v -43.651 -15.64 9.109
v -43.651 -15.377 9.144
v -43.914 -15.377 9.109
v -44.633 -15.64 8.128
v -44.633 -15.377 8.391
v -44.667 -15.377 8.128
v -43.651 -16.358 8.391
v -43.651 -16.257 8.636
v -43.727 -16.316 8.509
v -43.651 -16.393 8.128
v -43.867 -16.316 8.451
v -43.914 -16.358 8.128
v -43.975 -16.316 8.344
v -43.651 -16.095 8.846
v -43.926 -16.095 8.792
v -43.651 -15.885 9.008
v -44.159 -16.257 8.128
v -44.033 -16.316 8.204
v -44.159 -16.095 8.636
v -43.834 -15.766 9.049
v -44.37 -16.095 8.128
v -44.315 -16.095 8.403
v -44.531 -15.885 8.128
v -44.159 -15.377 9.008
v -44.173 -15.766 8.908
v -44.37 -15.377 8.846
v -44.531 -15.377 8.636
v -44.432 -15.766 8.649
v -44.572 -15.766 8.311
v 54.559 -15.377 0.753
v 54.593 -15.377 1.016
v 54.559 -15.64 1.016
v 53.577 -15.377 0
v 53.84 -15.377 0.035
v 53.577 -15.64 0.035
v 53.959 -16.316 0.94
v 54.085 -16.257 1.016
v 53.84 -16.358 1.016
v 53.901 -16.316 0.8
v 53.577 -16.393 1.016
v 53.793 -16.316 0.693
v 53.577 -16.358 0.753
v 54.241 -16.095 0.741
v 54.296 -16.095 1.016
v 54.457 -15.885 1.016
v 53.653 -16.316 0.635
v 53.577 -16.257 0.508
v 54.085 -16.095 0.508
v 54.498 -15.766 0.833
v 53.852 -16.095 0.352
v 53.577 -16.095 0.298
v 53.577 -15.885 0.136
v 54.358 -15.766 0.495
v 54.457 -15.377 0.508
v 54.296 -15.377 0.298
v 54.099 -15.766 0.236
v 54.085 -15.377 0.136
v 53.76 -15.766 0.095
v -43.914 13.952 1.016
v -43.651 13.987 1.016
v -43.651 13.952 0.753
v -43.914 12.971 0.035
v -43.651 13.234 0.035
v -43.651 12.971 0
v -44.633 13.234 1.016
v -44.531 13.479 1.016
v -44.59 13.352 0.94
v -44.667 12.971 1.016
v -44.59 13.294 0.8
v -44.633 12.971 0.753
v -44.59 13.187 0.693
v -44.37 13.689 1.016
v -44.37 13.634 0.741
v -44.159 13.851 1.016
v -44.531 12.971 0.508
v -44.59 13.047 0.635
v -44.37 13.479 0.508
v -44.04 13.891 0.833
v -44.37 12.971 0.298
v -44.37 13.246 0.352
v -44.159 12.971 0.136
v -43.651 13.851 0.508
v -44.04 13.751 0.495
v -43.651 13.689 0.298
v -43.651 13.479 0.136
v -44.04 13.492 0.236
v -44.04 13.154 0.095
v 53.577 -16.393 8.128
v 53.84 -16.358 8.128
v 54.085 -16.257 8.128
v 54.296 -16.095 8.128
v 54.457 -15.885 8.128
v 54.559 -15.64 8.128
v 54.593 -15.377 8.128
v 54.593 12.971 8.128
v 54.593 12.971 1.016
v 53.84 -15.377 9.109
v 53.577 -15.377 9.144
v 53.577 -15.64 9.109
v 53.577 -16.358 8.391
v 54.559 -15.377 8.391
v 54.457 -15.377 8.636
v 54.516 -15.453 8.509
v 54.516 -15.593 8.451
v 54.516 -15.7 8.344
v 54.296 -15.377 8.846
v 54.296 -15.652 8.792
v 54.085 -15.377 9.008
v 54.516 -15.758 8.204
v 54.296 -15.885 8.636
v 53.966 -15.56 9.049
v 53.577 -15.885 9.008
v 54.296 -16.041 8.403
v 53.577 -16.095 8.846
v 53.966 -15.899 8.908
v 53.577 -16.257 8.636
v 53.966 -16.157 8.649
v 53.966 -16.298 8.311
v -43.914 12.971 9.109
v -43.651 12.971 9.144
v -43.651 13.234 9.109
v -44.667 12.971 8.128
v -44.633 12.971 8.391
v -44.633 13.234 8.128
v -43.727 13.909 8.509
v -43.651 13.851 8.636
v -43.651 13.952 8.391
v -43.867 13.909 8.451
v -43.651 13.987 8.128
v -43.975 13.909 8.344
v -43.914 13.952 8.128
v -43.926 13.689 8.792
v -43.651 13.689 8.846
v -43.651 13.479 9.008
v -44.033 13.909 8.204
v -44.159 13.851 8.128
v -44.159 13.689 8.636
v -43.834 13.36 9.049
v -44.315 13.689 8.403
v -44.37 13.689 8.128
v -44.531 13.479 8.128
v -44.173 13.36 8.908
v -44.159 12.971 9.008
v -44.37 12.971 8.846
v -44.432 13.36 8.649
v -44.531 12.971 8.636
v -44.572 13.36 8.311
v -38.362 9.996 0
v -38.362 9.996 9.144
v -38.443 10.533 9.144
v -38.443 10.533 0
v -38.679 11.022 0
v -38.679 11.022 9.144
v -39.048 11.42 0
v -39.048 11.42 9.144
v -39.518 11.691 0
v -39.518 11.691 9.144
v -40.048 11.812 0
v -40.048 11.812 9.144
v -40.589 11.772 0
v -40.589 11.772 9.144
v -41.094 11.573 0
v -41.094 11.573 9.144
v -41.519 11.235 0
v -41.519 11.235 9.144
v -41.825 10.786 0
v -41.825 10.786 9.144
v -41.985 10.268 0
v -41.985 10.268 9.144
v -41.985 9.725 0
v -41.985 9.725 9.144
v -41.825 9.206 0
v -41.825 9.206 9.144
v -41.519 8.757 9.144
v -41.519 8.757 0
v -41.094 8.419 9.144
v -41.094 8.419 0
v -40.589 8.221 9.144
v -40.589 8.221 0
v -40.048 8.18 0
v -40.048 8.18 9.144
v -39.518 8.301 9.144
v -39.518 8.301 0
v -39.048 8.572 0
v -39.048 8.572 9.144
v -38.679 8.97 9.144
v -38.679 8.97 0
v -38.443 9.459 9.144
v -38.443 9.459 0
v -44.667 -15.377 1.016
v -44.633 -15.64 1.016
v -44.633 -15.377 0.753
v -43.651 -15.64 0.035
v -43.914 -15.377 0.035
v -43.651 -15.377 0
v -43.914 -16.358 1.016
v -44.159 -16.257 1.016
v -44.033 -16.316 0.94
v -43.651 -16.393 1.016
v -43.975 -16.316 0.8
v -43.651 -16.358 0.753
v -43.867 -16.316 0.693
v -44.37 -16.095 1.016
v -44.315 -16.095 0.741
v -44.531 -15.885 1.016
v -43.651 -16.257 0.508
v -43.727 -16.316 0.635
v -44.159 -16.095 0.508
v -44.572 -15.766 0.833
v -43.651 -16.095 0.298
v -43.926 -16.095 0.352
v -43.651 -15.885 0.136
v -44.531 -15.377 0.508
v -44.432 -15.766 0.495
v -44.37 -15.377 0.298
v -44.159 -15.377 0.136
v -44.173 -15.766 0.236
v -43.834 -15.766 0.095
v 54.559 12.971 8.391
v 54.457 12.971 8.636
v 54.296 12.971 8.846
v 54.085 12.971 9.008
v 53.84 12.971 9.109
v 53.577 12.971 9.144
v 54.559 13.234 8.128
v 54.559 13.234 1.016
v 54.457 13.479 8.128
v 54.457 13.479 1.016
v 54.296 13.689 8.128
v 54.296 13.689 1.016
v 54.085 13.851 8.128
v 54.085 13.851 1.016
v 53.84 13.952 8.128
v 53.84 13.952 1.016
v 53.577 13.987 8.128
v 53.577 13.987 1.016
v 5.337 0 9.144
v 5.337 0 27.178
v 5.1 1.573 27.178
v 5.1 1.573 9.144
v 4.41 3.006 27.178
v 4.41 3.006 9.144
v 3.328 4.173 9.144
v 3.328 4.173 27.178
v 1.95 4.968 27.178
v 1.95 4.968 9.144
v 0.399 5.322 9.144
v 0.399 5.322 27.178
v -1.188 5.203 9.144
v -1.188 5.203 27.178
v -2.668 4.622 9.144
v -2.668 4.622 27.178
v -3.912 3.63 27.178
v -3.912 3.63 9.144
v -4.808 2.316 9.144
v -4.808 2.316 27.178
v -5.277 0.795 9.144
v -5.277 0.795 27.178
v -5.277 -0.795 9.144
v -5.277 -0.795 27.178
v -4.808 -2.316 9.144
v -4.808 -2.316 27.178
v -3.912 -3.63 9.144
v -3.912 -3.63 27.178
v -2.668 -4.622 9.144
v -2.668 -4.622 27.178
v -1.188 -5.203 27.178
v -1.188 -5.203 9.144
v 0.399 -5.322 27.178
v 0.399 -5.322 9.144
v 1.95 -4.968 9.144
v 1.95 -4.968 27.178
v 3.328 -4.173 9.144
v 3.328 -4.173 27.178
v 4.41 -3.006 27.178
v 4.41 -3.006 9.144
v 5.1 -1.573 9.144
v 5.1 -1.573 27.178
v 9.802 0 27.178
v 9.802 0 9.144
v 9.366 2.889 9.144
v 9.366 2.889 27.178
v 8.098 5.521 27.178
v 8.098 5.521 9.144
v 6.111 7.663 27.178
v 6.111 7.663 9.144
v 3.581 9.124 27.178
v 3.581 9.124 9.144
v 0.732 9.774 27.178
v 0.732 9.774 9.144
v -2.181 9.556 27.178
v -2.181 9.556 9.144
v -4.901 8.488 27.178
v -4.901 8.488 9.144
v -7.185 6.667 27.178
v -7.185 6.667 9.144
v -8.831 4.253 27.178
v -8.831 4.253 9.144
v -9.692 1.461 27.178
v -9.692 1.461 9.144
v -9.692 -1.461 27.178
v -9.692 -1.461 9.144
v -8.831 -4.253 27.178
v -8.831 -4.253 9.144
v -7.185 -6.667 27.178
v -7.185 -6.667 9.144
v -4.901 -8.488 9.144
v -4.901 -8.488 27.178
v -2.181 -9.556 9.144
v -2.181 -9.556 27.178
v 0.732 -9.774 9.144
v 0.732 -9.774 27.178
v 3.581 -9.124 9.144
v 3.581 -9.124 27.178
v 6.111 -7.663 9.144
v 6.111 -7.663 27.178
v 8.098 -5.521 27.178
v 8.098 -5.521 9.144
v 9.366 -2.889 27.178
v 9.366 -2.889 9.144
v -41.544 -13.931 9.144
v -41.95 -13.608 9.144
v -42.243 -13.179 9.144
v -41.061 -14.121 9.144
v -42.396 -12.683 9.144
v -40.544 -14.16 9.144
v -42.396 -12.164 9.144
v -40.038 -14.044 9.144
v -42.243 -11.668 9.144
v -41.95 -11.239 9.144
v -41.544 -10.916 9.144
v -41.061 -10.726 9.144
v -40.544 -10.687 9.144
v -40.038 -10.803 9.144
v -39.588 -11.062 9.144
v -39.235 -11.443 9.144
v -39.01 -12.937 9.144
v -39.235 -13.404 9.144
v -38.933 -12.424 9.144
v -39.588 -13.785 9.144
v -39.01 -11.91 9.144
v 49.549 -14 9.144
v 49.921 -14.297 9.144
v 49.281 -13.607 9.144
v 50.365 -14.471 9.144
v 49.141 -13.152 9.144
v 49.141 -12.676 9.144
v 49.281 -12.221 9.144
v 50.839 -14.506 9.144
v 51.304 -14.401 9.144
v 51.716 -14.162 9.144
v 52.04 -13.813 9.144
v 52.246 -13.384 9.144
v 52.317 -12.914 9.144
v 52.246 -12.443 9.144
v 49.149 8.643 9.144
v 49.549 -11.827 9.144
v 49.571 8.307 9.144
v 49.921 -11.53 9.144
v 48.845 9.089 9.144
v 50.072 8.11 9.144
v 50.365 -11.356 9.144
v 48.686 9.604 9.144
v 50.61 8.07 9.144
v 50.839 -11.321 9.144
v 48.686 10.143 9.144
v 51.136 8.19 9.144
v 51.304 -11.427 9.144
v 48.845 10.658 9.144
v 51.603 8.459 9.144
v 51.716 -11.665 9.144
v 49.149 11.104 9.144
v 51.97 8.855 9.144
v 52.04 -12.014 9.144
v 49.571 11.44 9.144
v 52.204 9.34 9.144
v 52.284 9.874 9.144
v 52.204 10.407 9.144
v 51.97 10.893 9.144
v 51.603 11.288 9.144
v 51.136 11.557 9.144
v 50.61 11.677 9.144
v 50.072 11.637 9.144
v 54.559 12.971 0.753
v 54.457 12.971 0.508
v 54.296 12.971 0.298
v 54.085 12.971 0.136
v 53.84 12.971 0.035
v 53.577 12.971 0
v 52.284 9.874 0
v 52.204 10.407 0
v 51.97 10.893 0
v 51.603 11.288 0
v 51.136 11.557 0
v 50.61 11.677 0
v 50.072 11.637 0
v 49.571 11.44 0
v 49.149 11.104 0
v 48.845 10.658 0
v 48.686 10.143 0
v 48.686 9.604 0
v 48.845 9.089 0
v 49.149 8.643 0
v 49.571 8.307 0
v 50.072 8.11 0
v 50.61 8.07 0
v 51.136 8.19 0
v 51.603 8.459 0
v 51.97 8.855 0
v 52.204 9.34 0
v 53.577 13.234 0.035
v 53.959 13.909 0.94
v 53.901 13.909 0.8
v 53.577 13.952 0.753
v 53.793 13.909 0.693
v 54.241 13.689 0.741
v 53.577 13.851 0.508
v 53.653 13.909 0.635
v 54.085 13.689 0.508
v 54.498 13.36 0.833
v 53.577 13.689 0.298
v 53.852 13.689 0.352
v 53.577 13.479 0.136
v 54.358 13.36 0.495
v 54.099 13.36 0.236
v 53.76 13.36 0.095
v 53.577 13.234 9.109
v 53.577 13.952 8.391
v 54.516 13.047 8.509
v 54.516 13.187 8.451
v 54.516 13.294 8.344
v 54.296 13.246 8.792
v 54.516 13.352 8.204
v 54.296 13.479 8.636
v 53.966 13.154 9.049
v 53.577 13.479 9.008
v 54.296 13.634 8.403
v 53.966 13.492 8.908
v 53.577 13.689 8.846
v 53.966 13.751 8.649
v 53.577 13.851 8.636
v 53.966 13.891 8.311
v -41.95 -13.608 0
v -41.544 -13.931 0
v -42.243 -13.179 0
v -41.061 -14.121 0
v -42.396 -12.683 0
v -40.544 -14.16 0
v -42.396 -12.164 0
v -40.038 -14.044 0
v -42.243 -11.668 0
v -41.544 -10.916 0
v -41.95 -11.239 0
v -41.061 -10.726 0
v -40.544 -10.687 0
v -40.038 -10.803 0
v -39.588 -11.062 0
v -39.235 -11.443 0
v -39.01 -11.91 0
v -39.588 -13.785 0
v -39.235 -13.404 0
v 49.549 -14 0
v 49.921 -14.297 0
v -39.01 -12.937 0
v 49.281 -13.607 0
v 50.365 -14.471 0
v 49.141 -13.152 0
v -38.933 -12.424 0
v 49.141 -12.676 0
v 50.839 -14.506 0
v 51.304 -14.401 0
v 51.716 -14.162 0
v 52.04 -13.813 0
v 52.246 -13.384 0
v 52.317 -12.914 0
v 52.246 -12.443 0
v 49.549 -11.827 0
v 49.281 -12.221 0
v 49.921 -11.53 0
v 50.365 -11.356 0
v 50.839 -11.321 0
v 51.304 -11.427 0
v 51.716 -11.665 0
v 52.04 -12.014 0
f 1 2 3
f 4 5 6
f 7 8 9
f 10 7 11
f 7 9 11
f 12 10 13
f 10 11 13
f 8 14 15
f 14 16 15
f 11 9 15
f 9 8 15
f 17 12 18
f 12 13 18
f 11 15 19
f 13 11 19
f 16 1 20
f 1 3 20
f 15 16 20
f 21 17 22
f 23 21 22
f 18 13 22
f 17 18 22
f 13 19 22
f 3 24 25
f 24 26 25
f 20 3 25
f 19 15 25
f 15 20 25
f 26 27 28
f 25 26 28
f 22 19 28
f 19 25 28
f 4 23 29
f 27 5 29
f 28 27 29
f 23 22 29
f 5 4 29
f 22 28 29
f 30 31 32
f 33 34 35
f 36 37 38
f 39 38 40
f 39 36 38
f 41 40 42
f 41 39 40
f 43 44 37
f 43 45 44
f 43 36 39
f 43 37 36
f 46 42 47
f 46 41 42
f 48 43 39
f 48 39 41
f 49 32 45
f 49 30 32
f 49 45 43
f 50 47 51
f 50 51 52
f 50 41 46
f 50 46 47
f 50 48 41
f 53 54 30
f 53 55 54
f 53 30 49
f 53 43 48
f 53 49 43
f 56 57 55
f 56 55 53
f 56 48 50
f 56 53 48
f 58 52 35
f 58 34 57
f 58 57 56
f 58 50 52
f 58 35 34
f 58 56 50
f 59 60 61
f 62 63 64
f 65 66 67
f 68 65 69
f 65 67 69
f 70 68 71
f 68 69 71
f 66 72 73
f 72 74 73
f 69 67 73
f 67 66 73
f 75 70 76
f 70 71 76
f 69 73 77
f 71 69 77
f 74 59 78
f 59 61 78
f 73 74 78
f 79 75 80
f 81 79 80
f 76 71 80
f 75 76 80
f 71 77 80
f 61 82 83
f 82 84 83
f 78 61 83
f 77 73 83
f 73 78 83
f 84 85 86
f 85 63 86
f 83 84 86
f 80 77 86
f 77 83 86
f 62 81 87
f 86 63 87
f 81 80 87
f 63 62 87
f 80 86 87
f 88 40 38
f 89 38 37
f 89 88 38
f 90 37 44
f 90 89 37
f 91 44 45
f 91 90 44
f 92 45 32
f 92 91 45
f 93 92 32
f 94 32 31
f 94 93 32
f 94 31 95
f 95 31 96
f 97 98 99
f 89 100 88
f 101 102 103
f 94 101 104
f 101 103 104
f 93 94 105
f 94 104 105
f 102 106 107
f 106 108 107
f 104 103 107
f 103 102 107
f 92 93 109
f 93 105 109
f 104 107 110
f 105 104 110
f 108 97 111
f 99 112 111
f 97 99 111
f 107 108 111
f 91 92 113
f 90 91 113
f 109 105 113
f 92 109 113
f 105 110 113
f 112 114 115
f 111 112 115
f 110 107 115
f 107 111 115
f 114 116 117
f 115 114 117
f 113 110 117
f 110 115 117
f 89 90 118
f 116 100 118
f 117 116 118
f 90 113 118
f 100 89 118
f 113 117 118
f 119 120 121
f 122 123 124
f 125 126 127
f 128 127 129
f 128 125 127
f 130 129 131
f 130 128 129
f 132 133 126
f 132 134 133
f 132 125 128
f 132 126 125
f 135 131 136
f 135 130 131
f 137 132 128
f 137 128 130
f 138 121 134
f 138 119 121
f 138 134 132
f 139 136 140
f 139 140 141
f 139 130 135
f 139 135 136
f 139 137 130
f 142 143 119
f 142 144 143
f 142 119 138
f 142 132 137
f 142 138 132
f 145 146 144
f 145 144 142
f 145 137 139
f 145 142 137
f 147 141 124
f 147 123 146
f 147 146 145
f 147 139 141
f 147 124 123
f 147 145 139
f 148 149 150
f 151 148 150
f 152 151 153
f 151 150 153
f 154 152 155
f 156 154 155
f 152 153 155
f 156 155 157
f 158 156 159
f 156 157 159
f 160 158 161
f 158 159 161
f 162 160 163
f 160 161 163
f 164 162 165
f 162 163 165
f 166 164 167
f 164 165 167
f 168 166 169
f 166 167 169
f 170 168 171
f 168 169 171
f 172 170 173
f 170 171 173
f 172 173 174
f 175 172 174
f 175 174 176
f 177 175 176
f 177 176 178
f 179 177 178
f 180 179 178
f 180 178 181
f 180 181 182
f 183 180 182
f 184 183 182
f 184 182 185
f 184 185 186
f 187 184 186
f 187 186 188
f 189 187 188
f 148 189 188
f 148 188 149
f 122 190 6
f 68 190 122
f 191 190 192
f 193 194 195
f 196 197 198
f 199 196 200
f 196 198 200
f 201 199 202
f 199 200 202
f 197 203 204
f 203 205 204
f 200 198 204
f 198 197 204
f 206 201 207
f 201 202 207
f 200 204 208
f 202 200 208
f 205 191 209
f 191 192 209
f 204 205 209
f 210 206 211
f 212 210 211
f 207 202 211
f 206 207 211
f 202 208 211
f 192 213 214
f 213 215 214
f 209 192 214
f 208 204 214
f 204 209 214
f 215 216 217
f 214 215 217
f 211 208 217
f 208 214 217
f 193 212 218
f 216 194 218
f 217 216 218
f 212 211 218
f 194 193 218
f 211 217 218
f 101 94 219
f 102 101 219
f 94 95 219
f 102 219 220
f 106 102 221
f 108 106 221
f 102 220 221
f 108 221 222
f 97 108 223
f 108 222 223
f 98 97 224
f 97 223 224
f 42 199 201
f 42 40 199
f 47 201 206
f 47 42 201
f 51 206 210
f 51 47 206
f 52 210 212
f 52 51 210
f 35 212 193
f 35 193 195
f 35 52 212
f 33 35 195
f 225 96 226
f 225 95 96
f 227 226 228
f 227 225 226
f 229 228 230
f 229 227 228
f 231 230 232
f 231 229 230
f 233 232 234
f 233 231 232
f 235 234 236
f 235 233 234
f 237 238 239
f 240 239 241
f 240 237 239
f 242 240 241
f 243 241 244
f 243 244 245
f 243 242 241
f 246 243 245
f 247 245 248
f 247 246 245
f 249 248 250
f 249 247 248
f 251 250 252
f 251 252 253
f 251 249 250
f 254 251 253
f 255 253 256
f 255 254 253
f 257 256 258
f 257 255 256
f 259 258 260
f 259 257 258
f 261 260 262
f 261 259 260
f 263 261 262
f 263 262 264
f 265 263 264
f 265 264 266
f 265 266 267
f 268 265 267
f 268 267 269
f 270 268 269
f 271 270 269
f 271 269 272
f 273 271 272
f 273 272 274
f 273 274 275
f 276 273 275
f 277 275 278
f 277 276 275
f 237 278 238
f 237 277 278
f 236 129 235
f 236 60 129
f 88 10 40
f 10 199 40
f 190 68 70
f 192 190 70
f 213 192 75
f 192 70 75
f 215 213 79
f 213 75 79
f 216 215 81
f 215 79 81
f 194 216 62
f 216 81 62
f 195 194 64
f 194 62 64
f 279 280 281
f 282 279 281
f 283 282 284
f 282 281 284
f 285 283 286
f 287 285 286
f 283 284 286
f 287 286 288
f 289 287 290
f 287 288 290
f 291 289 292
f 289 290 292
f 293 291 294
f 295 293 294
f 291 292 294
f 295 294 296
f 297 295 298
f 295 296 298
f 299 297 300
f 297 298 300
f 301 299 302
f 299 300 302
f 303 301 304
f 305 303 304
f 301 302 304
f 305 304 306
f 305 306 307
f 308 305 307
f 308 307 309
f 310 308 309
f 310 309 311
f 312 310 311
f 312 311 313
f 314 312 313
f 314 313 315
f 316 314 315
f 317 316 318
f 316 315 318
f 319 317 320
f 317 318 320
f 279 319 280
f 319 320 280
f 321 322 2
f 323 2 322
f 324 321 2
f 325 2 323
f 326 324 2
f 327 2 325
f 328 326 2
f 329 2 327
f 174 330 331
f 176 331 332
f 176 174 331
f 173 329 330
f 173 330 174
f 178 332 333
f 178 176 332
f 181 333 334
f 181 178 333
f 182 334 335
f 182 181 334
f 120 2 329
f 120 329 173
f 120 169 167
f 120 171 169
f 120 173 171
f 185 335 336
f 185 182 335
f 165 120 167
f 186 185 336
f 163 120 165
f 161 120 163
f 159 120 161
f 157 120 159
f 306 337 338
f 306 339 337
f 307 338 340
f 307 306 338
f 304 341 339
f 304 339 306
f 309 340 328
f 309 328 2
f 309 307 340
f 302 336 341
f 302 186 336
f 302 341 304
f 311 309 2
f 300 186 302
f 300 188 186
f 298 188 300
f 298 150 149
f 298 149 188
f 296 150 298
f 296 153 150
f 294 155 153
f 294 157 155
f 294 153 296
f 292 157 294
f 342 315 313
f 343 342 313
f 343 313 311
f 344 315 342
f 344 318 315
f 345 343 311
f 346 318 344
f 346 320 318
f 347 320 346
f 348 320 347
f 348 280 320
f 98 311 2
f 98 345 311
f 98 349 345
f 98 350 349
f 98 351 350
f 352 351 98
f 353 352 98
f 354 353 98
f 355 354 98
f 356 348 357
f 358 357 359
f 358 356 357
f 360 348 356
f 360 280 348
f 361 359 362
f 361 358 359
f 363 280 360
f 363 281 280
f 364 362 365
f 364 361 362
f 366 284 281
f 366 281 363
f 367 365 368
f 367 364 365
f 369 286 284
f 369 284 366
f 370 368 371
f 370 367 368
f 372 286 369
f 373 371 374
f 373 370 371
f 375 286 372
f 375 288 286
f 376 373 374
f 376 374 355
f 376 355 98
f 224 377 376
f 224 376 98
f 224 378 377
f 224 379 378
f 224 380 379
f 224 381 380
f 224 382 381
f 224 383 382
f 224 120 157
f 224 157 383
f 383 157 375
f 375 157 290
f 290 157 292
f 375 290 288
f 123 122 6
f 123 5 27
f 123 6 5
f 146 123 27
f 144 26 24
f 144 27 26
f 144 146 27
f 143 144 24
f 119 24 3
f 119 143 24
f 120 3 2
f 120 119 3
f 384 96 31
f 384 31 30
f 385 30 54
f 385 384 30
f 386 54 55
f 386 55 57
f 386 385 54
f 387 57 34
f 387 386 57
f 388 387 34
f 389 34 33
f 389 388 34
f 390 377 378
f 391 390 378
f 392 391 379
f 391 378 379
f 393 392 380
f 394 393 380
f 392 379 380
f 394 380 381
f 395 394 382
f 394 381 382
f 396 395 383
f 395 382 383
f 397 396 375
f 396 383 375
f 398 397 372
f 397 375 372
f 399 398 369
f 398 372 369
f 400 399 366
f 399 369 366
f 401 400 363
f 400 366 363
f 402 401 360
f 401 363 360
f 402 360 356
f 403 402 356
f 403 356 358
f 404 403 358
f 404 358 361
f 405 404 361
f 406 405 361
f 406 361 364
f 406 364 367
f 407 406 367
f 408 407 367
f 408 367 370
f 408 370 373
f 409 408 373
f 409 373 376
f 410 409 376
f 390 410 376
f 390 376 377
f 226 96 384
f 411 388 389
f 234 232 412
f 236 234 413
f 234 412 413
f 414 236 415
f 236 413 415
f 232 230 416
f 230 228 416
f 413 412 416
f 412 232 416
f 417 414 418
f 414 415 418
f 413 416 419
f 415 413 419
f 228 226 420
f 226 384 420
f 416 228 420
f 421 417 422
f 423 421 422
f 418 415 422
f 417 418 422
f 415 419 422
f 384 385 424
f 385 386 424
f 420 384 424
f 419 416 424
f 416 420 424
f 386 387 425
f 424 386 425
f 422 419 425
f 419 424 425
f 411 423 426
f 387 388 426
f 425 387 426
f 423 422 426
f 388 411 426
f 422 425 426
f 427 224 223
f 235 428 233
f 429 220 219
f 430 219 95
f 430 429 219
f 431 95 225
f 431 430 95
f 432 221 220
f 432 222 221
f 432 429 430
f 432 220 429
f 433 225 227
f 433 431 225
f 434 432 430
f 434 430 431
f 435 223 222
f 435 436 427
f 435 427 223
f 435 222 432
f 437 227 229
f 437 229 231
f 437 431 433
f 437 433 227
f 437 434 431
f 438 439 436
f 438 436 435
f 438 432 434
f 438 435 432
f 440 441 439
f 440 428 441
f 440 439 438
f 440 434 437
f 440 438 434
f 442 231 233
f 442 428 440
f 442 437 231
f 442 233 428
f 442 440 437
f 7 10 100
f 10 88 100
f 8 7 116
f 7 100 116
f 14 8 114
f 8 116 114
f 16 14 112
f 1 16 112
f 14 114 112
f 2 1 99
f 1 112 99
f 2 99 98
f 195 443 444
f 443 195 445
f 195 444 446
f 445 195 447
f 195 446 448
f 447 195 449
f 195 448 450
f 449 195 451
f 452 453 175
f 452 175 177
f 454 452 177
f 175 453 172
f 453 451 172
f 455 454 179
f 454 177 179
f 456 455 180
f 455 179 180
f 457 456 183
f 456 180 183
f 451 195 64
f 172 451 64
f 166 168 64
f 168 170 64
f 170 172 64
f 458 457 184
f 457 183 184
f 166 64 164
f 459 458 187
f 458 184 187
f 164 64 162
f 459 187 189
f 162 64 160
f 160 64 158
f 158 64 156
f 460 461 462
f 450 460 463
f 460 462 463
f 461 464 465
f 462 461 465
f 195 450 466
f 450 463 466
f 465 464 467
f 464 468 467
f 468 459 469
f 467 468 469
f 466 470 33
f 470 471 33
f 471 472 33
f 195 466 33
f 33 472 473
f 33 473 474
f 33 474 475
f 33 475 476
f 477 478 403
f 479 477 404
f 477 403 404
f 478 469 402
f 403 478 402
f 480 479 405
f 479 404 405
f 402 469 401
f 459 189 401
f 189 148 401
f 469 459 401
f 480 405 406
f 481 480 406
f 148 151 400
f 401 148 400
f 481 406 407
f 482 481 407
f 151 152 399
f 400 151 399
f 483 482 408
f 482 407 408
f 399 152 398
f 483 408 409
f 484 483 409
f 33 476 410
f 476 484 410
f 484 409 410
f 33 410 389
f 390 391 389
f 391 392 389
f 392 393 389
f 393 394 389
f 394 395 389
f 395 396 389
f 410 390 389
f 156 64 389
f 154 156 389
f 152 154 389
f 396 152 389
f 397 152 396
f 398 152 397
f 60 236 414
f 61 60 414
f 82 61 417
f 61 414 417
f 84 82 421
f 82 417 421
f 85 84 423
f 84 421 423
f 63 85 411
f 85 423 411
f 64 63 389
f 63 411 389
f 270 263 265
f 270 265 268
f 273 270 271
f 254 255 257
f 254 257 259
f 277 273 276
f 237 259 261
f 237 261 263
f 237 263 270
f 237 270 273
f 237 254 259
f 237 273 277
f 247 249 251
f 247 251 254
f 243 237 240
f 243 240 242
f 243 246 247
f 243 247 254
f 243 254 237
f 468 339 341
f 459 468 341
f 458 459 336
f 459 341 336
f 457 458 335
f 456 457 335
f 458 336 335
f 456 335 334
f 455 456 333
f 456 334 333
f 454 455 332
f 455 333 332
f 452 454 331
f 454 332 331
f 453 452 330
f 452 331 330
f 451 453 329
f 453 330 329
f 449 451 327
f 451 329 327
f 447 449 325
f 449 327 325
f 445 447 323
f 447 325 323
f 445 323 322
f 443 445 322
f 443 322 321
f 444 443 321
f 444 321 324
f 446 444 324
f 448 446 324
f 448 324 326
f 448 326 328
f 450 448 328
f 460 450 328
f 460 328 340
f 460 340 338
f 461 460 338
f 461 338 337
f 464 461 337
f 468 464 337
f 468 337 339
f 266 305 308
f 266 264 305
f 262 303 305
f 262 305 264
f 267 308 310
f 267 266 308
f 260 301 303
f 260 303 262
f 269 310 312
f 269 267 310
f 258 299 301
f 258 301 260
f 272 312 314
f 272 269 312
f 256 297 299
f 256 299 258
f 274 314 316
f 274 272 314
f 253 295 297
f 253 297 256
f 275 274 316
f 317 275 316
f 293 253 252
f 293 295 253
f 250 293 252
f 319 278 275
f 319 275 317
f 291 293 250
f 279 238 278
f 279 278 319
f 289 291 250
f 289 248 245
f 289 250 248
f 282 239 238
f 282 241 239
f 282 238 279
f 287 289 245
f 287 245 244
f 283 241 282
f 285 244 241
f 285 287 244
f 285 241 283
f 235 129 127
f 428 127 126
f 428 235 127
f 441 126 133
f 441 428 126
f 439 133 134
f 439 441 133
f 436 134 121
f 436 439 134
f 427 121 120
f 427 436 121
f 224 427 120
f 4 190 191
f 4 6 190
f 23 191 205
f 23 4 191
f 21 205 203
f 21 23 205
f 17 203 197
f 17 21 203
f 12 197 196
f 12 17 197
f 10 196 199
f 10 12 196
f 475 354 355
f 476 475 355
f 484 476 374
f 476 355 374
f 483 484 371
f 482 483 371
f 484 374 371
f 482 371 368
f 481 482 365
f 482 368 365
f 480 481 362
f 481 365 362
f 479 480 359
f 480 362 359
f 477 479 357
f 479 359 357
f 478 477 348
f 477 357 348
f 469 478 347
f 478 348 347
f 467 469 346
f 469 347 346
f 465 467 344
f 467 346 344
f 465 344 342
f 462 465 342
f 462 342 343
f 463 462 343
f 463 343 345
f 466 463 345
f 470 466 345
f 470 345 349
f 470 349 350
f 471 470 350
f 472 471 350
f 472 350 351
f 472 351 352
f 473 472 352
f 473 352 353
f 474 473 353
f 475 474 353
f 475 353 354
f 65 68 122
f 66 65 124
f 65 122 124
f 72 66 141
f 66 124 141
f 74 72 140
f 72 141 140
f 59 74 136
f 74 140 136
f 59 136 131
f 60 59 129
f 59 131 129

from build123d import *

# Parameters (mm, degrees)
F0_W     = 99.260524
F0_H     = 30.379737
F1_DEPTH = 9.144
F2_R     = 1.016
F3_R     = 1.597357
F3_R_2   = 1.808865
F3_R_3   = 1.82127
F3_R_4   = 1.741221
F4_DEPTH = 9.145
F3_R_5   = 9.801511
F3_R_6   = 5.336949
F5_DEPTH = 18.034


with BuildPart() as f1:
    # F0 (on Top) → F1 (new body)
    with BuildSketch(Plane.XY):
        with Locations((4.963025, -1.203157)):
            Rectangle(F0_W, F0_H)
    extrude(amount=F1_DEPTH)

    # F2
    f2_edges = [f1.edges().sort_by_distance(p)[0] for p in [
        (-44.667237, -1.203157, 9.144),
        (4.963025, 13.986711, 9.144),
        (4.963025, -16.393026, 9.144),
        (54.593287, -1.203157, 9.144),
        (54.593287, -1.203157, 0),
        (54.593287, 13.986711, 4.572),
        (54.593287, -16.393026, 4.572),
        (4.963025, 13.986711, 0),
        (-44.667237, 13.986711, 4.572),
        (-44.667237, -1.203157, 0),
        (-44.667237, -16.393026, 4.572),
        (4.963025, -16.393026, 0),
    ]]
    fillet(f2_edges, radius=F2_R)

    # F3 (on face) → F4 (cut, through all)
    with BuildSketch(Plane.XY.offset(9.144)):
        with Locations((50.720021, -12.913582)):
            Circle(F3_R)
        with Locations((50.474998, 9.873613)):
            Circle(F3_R_2)
        with Locations((-40.183738, 9.996125)):
            Circle(F3_R_3)
        with Locations((-40.673785, -12.423535)):
            Circle(F3_R_4)
    extrude(amount=-F4_DEPTH, mode=Mode.SUBTRACT)

    # F3 (on face) → F5 (join)
    with BuildSketch(Plane.XY.offset(9.144)):
        Circle(F3_R_5)
        Circle(F3_R_6, mode=Mode.SUBTRACT)
    extrude(amount=F5_DEPTH)


solid = f1.part
